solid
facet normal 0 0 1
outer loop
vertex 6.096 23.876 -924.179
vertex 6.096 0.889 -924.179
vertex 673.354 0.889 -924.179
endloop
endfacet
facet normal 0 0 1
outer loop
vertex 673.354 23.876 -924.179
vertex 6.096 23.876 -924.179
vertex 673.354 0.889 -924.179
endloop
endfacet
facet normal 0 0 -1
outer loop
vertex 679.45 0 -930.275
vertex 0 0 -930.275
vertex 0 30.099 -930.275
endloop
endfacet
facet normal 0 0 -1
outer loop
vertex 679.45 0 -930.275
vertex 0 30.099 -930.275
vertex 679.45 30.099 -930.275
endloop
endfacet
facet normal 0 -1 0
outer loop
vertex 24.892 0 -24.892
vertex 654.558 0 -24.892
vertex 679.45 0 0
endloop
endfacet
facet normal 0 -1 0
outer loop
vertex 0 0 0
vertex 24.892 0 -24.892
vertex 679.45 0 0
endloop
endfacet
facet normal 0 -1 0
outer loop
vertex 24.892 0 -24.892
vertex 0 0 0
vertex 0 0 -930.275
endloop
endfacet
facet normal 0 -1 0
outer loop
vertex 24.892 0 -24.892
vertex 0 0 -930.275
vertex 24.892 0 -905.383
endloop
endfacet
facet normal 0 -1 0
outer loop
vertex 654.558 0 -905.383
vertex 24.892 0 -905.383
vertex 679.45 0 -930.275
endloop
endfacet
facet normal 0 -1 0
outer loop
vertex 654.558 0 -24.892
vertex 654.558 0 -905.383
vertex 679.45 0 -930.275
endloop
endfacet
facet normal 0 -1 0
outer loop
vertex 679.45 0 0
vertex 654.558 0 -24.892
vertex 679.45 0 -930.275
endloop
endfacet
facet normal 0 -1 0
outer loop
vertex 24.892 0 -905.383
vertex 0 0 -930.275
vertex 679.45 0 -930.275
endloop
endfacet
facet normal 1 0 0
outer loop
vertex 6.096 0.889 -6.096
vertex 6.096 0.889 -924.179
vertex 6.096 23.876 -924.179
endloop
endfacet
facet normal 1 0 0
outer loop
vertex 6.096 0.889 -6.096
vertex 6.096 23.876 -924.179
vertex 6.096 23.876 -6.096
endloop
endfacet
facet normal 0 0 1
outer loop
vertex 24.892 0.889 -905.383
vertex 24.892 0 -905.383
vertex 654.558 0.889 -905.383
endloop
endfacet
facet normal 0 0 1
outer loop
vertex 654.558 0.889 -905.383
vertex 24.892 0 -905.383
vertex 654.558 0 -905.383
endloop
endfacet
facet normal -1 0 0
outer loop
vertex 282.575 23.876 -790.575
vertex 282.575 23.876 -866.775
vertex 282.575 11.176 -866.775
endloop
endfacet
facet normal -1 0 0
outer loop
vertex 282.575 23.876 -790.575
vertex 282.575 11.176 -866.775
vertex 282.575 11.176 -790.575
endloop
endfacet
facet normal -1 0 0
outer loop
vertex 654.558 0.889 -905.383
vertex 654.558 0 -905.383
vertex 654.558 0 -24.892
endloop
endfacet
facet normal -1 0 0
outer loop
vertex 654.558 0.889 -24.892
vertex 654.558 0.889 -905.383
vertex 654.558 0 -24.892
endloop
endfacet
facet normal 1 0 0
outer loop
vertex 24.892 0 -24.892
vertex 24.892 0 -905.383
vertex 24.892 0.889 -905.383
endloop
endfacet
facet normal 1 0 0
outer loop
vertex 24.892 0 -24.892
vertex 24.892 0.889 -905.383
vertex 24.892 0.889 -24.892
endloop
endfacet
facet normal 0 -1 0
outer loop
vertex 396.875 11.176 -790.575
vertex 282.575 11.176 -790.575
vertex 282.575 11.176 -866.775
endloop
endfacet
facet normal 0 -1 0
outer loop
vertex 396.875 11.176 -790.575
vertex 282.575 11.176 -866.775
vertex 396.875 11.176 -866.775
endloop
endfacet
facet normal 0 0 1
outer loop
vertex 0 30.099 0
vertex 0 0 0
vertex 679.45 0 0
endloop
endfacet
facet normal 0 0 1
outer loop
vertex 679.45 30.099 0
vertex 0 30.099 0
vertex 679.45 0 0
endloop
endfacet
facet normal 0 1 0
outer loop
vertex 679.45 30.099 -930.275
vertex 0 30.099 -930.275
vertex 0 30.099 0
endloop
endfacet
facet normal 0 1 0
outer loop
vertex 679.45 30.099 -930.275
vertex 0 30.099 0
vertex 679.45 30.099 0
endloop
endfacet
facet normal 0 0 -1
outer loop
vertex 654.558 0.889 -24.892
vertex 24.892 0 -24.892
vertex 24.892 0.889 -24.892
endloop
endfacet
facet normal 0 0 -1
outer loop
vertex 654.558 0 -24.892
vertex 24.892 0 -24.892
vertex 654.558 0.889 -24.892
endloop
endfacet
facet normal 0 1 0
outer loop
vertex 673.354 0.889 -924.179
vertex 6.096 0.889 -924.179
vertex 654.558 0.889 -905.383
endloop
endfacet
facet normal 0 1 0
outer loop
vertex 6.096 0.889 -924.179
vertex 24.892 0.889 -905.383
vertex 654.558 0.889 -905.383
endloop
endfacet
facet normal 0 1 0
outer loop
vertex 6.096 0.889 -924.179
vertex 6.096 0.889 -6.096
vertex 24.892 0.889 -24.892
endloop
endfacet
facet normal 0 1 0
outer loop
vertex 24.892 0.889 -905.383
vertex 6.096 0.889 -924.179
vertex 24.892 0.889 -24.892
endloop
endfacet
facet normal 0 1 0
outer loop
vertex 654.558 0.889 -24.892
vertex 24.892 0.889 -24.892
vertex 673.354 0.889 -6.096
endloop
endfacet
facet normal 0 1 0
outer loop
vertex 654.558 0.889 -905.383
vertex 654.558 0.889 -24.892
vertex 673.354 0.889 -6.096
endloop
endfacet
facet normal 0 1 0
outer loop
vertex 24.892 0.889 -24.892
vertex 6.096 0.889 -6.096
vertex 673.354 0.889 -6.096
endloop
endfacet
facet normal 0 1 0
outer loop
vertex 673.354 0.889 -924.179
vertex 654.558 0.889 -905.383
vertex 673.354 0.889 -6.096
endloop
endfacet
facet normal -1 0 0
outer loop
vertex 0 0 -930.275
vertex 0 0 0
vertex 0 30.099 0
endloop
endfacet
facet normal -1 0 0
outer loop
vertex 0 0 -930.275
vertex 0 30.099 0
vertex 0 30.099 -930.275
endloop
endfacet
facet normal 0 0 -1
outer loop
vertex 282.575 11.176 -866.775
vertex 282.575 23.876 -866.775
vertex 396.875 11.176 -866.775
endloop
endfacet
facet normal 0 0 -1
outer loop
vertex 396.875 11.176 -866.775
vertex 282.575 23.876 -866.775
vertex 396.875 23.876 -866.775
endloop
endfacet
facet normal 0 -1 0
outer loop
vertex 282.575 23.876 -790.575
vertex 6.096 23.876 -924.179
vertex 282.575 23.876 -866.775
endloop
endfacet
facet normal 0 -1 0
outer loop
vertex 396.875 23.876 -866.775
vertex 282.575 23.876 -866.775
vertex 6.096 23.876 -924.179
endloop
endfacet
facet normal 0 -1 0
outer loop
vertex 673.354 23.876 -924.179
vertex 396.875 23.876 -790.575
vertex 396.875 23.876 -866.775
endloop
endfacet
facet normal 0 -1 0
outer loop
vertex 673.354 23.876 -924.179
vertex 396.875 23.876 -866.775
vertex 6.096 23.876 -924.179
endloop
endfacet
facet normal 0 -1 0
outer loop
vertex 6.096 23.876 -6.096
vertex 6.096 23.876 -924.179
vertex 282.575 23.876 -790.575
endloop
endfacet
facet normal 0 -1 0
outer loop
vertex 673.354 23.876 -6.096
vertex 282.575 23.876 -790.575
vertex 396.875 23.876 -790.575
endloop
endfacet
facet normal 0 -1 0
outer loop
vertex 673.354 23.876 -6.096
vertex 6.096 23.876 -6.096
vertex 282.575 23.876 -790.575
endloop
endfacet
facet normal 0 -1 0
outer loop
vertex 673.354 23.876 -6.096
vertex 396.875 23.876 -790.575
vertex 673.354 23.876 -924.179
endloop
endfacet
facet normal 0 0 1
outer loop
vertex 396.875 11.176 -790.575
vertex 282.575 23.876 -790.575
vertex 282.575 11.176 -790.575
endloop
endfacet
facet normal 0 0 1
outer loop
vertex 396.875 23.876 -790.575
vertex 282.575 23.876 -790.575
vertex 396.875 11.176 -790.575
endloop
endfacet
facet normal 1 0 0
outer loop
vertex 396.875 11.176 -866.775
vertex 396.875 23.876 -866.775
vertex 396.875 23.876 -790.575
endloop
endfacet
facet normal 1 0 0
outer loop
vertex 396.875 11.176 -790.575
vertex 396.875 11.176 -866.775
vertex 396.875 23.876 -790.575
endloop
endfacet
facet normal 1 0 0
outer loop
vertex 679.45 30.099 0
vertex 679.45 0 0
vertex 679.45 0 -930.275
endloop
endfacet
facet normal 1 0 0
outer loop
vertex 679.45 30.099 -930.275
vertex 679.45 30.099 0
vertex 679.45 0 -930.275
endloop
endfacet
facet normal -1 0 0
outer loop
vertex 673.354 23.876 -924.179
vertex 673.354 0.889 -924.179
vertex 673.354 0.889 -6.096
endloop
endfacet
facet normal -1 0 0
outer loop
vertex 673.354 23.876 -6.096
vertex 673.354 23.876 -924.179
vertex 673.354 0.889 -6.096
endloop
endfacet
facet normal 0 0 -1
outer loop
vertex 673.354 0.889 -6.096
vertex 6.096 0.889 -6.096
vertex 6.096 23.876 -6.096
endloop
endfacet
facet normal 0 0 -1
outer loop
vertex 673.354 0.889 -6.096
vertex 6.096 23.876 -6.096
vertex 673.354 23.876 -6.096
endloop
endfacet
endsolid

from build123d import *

# Parameters (mm, degrees)
SKETCH1_W           = 679.45
SKETCH1_H           = 930.275
BOSS_EXTRUDE1_DEPTH = 30.099
SKETCH2_W           = 667.258
SKETCH2_H           = 918.083
CUT_EXTRUDE1_DEPTH  = 23.876
SKETCH3_W           = 679.45
SKETCH3_H           = 930.275
SKETCH3_W_2         = 629.666
SKETCH3_H_2         = 880.491
BOSS_EXTRUDE2_DEPTH = 0.889
SKETCH4_W           = 114.3
SKETCH4_H           = 76.2
BOSS_EXTRUDE3_DEPTH = 12.7


with BuildPart() as part:
    # Sketch1 → Boss-Extrude1 (new body)
    with BuildSketch(Plane(origin=(0, 0, 0), x_dir=(1, 0, 0), z_dir=(0, 1, 0))):
        with Locations((339.725, 465.1375)):
            Rectangle(SKETCH1_W, SKETCH1_H)
    extrude(amount=BOSS_EXTRUDE1_DEPTH)

    # Sketch2 → Cut-Extrude1 (cut)
    with BuildSketch(Plane.XZ):
        with Locations((339.725, -465.1375)):
            Rectangle(SKETCH2_W, SKETCH2_H)
    extrude(amount=-CUT_EXTRUDE1_DEPTH, mode=Mode.SUBTRACT)

    # Sketch3 → Boss-Extrude2 (add)
    with BuildSketch(Plane.XZ):
        with Locations((339.725, -465.1375)):
            Rectangle(SKETCH3_W, SKETCH3_H)
        with Locations((339.725, -465.1375)):
            Rectangle(SKETCH3_W_2, SKETCH3_H_2, mode=Mode.SUBTRACT)
    extrude(amount=-BOSS_EXTRUDE2_DEPTH)

    # Sketch4 → Boss-Extrude3 (add)
    with BuildSketch(Plane.XZ.offset(-23.876)):
        with Locations((339.725, -828.675)):
            Rectangle(SKETCH4_W, SKETCH4_H)
    extrude(amount=BOSS_EXTRUDE3_DEPTH)


solid = part.part
